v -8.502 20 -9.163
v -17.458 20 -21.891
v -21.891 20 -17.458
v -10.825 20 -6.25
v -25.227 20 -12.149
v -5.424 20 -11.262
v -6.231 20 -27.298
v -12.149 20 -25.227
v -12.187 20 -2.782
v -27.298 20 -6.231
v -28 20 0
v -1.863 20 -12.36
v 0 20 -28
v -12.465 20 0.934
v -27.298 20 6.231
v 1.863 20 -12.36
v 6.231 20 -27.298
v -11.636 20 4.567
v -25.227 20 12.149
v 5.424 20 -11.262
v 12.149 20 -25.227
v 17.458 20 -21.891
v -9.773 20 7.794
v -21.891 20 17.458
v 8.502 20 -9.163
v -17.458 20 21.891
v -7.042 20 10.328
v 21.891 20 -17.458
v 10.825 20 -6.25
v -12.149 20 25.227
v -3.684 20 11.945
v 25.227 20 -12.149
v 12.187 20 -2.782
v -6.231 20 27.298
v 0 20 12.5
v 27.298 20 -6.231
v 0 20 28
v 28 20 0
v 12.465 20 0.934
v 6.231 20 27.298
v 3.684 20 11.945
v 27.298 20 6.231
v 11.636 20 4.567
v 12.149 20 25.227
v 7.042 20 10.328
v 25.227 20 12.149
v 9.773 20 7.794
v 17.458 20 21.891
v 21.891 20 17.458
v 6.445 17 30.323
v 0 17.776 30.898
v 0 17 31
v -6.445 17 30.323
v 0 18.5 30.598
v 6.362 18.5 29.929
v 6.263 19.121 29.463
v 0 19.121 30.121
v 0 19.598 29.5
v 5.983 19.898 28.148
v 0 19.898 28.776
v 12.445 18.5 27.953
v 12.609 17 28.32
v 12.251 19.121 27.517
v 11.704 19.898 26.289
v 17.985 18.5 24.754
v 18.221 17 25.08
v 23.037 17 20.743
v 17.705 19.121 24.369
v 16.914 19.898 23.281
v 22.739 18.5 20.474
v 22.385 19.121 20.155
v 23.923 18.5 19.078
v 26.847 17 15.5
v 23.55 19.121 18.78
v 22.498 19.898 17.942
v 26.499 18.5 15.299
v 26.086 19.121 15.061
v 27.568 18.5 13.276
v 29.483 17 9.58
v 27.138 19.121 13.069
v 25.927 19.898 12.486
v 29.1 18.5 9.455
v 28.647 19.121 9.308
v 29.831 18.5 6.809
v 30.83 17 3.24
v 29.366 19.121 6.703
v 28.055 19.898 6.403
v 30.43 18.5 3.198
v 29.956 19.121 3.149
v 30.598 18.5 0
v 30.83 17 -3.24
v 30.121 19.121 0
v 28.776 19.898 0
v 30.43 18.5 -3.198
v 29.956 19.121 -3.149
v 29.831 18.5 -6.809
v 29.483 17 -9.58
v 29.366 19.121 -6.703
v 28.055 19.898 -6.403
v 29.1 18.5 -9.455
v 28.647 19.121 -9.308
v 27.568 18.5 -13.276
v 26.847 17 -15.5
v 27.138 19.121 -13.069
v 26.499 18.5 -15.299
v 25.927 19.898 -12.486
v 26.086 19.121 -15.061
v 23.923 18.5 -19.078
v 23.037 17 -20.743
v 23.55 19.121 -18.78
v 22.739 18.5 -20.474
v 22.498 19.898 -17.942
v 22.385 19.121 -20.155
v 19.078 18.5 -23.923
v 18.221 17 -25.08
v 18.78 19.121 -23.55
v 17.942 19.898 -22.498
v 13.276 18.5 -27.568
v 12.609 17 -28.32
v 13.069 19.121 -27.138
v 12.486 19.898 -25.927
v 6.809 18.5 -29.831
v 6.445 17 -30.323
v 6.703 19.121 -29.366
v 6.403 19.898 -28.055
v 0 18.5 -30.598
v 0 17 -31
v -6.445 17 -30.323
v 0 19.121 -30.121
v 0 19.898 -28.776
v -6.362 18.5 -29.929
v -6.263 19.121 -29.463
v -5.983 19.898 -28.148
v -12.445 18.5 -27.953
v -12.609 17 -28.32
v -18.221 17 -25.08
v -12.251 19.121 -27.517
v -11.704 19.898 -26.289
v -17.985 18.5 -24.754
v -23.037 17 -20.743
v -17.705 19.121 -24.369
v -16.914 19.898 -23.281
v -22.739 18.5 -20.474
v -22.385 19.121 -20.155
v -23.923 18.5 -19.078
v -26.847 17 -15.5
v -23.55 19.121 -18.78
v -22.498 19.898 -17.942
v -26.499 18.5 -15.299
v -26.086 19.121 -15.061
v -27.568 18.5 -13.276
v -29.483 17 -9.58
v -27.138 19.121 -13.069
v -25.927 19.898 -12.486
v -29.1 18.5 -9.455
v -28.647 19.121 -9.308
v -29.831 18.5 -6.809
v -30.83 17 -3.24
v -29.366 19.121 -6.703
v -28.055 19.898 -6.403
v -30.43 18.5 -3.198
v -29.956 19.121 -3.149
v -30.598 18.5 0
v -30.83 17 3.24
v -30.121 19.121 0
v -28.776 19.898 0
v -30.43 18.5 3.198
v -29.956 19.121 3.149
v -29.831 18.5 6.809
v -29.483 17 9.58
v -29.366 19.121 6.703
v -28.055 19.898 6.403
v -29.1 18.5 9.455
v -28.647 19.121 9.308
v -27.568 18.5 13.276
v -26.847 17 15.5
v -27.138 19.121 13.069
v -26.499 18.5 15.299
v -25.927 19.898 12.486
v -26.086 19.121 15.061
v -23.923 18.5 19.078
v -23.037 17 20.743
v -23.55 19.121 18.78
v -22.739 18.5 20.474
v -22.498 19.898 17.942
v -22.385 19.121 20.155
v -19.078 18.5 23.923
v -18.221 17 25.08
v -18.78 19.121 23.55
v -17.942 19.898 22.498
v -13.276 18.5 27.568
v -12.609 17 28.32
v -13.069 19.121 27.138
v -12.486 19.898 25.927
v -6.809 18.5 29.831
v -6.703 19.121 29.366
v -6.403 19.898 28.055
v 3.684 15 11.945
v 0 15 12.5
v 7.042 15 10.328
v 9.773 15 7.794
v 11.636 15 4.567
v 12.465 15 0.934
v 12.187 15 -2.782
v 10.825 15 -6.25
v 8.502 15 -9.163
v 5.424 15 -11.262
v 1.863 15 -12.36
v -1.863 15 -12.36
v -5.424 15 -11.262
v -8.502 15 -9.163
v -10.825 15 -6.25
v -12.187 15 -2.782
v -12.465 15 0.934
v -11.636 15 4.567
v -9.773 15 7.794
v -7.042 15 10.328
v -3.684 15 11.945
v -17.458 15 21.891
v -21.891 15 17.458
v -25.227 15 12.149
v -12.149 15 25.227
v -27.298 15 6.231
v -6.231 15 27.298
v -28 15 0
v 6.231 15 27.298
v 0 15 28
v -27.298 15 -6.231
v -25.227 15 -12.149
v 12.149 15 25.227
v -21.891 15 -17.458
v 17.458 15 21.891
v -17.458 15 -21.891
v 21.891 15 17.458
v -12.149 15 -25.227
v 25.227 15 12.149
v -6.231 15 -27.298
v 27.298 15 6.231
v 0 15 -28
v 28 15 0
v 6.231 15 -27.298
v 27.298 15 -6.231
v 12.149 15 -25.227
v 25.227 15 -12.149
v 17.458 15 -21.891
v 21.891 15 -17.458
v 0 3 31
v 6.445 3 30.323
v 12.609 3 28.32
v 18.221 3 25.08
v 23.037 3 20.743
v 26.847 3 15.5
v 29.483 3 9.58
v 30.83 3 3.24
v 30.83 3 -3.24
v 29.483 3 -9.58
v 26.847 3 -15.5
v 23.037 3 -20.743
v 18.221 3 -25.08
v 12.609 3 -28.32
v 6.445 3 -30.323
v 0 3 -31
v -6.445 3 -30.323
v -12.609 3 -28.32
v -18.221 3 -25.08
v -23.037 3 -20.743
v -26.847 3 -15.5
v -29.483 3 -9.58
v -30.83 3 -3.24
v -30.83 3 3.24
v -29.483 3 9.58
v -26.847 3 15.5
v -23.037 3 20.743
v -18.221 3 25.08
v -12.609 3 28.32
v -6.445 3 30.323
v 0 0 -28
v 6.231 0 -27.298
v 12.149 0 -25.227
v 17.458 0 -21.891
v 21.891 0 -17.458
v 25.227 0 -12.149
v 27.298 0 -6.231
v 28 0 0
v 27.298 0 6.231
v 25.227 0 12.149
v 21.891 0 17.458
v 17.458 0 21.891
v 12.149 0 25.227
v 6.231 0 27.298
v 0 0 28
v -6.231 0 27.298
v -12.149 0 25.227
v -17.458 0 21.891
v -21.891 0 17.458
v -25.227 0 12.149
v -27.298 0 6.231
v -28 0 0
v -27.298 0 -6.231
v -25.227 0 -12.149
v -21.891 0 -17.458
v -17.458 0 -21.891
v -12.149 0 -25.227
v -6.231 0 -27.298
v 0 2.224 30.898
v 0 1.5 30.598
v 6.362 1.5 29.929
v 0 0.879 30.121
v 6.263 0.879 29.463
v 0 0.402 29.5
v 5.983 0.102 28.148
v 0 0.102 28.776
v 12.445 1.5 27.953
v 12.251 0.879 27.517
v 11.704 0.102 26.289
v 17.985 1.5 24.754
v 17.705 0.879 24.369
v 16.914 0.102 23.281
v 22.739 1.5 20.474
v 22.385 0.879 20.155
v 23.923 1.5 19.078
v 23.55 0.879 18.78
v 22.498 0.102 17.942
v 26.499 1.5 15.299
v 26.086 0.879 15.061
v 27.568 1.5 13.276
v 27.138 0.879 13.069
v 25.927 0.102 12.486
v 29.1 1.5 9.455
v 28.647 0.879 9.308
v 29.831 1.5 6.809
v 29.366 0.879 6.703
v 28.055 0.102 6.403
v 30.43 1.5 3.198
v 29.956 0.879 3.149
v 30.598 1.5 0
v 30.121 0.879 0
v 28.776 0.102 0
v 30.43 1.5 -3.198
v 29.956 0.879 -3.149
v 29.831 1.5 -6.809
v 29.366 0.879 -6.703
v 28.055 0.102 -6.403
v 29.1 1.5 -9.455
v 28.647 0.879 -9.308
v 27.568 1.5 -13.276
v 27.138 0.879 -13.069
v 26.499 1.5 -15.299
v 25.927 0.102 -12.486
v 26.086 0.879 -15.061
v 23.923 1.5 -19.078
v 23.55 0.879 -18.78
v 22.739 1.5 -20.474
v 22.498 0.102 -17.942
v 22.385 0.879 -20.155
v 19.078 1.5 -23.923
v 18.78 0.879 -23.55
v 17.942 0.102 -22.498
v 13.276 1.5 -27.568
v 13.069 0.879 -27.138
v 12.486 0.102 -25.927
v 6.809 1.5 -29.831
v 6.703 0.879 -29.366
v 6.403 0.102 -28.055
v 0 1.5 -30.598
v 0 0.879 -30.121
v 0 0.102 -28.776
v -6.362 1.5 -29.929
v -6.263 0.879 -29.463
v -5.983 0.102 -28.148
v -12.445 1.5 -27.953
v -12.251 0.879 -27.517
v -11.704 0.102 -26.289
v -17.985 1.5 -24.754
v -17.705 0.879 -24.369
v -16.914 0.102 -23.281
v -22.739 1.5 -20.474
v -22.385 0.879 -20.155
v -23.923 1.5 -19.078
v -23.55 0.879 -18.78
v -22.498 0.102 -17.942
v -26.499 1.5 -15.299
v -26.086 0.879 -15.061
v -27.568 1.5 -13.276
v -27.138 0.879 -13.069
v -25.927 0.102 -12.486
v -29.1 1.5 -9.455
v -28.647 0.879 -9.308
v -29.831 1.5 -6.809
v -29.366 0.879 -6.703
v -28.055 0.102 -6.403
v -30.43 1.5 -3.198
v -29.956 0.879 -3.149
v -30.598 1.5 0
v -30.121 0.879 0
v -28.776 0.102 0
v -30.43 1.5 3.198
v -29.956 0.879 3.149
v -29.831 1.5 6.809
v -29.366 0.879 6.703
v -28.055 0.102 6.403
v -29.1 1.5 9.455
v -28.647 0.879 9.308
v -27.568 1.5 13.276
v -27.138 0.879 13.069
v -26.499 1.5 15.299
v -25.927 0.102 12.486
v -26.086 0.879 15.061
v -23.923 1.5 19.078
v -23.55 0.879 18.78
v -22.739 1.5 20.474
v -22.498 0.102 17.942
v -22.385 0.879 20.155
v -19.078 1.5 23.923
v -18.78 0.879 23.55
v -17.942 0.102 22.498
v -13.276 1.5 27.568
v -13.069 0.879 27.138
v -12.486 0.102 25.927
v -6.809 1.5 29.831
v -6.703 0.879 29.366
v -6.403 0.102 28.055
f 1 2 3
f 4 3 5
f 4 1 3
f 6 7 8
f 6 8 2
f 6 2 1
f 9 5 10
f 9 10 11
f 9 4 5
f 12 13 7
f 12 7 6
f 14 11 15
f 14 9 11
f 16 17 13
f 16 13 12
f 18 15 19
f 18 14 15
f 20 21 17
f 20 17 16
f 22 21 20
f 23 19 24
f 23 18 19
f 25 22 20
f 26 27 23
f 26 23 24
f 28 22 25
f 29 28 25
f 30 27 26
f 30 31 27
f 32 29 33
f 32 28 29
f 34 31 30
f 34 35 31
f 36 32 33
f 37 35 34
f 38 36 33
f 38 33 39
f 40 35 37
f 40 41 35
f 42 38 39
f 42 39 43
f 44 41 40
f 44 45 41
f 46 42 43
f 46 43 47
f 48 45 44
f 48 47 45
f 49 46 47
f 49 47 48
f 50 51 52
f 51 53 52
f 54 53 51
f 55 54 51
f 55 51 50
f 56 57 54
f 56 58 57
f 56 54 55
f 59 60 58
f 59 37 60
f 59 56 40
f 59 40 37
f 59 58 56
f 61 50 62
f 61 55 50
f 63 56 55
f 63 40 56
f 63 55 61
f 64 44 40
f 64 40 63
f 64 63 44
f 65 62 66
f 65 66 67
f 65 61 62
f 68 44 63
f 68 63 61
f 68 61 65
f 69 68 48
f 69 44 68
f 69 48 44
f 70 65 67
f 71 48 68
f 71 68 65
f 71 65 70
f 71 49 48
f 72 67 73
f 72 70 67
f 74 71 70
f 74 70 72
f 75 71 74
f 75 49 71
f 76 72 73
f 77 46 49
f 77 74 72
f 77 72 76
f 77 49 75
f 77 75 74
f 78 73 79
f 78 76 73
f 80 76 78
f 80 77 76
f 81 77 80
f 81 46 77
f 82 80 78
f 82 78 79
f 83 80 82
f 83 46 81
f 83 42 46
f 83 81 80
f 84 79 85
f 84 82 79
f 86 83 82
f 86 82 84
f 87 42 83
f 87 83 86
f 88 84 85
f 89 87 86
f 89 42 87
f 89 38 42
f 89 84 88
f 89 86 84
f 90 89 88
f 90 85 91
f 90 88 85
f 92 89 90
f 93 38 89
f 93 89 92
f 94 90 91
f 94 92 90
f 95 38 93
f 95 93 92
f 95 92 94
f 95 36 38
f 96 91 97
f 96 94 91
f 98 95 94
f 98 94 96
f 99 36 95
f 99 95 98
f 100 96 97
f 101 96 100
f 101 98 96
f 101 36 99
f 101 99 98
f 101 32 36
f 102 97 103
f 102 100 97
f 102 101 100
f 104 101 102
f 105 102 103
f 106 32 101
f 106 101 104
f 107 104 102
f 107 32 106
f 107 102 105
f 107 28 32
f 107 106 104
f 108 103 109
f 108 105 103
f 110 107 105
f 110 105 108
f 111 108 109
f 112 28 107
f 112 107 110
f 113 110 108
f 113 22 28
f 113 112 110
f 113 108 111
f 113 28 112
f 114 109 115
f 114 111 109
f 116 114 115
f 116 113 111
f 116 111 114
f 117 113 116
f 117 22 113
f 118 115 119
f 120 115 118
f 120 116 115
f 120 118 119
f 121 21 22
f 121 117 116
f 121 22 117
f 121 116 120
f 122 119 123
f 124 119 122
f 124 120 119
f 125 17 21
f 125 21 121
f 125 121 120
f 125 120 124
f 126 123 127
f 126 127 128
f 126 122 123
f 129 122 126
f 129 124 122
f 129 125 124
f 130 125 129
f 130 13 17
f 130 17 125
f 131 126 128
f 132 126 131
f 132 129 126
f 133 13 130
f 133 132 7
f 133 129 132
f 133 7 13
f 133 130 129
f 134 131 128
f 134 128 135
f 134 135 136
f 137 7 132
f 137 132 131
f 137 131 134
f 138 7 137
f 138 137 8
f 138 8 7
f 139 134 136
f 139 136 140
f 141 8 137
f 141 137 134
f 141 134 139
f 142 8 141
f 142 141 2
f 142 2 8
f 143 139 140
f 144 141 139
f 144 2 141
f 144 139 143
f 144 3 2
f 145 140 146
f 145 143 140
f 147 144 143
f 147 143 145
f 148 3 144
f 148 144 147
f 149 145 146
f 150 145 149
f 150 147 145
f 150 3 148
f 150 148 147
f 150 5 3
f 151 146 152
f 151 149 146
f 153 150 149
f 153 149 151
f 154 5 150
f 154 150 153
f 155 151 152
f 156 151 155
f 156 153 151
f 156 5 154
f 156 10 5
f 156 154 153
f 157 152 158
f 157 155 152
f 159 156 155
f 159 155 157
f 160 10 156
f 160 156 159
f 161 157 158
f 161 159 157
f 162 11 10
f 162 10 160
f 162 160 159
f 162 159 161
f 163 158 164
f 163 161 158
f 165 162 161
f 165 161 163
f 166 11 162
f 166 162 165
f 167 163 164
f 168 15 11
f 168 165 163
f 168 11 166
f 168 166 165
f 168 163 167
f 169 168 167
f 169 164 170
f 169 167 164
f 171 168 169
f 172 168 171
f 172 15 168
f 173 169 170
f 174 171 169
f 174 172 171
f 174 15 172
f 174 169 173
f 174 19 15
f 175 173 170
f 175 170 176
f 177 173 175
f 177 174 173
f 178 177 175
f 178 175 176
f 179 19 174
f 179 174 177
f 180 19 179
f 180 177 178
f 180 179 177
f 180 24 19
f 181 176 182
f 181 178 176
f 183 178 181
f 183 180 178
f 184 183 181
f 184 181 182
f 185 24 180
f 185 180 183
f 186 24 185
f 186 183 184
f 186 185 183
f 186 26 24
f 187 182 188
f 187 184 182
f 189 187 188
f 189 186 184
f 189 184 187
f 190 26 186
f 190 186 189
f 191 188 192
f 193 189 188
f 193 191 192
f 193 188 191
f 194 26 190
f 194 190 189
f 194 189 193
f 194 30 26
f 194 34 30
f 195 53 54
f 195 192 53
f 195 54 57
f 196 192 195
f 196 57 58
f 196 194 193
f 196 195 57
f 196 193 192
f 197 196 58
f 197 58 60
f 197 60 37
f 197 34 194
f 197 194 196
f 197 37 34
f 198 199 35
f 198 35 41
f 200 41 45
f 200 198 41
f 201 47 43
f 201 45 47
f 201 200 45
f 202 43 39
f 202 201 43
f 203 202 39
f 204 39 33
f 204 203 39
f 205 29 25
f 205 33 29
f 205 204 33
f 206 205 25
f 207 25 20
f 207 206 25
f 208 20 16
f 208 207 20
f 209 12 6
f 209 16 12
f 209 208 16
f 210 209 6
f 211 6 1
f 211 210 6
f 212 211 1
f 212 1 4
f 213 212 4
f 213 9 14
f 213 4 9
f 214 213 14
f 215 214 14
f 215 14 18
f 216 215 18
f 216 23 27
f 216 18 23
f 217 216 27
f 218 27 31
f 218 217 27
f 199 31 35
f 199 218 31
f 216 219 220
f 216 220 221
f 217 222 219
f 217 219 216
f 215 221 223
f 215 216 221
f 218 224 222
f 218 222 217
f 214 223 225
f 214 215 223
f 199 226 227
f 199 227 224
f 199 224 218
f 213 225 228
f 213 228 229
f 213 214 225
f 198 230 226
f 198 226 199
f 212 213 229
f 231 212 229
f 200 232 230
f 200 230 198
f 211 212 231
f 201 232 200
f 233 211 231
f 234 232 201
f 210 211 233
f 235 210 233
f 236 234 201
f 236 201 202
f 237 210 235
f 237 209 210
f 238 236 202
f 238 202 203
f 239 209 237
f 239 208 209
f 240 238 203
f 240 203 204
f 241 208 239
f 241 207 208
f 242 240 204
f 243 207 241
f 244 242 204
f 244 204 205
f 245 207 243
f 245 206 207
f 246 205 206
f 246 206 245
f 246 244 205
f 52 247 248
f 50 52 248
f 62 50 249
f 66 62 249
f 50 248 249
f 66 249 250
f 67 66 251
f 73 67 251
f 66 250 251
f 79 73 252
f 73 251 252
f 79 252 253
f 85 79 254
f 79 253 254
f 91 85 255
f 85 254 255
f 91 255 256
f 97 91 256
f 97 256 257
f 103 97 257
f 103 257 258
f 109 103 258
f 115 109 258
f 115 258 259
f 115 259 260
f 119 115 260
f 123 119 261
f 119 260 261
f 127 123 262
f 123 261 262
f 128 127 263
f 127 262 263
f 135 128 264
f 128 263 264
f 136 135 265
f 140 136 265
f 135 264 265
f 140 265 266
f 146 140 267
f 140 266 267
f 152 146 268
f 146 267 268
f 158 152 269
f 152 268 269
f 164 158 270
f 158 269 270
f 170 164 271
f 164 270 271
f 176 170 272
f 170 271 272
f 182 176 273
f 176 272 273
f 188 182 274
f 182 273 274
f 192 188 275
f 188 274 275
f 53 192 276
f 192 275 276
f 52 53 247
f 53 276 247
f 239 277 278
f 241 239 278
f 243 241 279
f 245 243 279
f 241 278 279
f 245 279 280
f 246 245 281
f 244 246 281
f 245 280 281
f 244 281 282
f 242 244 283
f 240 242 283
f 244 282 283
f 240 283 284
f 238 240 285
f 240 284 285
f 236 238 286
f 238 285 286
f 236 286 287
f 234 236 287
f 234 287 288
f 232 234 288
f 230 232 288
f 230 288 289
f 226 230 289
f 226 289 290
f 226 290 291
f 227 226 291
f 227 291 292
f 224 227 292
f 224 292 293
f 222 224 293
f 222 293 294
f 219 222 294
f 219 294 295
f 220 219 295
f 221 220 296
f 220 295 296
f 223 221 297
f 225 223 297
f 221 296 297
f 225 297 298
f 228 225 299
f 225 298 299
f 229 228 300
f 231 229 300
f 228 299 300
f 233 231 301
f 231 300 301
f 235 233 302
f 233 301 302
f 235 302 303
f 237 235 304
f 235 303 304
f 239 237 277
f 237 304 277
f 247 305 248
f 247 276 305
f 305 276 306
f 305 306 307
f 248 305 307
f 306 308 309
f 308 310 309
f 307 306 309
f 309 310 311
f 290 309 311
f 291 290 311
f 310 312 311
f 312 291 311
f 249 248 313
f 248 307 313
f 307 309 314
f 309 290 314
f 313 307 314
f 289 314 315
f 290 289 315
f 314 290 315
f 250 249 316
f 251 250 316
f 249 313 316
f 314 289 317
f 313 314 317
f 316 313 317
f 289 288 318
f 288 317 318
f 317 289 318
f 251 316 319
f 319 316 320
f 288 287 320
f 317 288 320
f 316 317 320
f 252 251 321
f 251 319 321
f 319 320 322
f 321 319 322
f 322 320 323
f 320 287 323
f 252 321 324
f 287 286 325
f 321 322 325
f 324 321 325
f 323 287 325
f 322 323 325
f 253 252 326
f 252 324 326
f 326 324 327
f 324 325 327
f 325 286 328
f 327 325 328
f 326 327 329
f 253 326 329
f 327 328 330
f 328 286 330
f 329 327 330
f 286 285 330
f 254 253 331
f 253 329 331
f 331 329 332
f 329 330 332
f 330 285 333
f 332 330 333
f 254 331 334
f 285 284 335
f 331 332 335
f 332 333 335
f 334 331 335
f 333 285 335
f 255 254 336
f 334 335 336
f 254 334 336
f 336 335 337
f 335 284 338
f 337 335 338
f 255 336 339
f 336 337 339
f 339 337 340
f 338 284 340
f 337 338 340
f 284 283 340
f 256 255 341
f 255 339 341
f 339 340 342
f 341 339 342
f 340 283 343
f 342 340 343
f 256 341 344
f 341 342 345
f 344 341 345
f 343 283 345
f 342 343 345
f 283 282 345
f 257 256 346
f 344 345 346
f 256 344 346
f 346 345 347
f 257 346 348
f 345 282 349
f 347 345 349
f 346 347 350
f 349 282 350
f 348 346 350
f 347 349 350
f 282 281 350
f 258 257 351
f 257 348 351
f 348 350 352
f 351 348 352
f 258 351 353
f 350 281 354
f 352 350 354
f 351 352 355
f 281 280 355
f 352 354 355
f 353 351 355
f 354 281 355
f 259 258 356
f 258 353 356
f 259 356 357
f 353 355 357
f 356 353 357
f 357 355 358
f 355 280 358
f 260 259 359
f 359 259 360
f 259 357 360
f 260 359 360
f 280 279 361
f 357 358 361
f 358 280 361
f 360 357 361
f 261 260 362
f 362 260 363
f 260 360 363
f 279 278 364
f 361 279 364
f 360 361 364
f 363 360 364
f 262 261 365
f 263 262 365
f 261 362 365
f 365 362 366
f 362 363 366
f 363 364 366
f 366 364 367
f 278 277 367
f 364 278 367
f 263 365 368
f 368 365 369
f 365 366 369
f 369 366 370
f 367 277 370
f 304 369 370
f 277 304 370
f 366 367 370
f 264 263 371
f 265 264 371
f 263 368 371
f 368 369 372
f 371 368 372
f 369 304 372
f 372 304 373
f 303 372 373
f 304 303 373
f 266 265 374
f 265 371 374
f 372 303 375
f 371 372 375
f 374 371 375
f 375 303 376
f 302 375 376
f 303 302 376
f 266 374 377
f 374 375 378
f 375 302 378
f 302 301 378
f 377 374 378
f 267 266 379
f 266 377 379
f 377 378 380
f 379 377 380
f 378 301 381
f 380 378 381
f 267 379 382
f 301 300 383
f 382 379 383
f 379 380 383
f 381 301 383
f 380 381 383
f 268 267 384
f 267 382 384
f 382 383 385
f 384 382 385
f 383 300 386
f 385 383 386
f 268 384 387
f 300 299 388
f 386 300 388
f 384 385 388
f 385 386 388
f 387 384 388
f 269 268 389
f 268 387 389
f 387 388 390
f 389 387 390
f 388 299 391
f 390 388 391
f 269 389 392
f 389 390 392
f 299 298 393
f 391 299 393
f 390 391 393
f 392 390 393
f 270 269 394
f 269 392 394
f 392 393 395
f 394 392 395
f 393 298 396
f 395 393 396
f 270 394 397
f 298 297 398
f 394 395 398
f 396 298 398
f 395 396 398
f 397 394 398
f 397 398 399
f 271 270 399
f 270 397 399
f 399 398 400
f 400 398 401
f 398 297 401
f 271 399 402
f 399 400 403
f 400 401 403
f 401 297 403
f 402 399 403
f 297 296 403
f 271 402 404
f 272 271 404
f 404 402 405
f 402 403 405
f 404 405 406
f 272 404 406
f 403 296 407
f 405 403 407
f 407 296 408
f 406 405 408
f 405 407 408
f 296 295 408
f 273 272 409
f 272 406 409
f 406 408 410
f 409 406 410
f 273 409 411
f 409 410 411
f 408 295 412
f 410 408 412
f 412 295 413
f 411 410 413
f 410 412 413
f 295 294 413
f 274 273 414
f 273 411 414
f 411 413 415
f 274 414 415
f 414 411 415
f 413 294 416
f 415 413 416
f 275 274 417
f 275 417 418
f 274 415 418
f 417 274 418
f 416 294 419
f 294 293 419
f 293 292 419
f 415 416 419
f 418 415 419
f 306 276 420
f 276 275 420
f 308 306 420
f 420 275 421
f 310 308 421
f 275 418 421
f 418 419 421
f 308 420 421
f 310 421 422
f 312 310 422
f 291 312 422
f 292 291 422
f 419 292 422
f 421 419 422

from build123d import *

# Parameters (mm, degrees)
SKETCH1_R               = 31
BOSS_EXTRUDE1_DEPTH     = 20
FILLET1_R               = 3
SKETCH2_R               = 28
CUT_EXTRUDE1_DEPTH      = 15
CUT_EXTRUDE2_DEPTH      = 49.187135341
CUT_EXTRUDE2_DEPTH_BACK = 49.187135341
SKETCH3_R               = 12.5


with BuildPart() as part:
    # Sketch1 → Boss-Extrude1 (new body)
    with BuildSketch(Plane(origin=(0, 0, 0), x_dir=(1, 0, 0), z_dir=(0, 1, 0))):
        with Locations(Location((0, 0, 0), (0, 0, 270))):
            Circle(SKETCH1_R)
    extrude(amount=BOSS_EXTRUDE1_DEPTH)

    # Fillet1
    fillet1_edges = [part.edges().sort_by_distance(p)[0] for p in [
        (0, 0, -31),
        (0, 20, -31),
    ]]
    fillet(fillet1_edges, radius=FILLET1_R)

    # Sketch2 → Cut-Extrude1 (cut)
    with BuildSketch(Plane.XZ):
        with Locations(Location((0, 0, 0), (0, 0, 270))):
            Circle(SKETCH2_R)
    extrude(amount=-CUT_EXTRUDE1_DEPTH, mode=Mode.SUBTRACT)

    # Sketch3 → Cut-Extrude2 (cut, two sides: drawn at the far end of the back side and taken through both)
    with BuildSketch(Plane(origin=(0, 20, 0), x_dir=(1, 0, 0), z_dir=(0, 1, 0)).offset(-CUT_EXTRUDE2_DEPTH_BACK)):
        with Locations(Location((0, 0, 0), (0, 0, 270))):
            Circle(SKETCH3_R)
    extrude(amount=CUT_EXTRUDE2_DEPTH + CUT_EXTRUDE2_DEPTH_BACK, mode=Mode.SUBTRACT)


solid = part.part
